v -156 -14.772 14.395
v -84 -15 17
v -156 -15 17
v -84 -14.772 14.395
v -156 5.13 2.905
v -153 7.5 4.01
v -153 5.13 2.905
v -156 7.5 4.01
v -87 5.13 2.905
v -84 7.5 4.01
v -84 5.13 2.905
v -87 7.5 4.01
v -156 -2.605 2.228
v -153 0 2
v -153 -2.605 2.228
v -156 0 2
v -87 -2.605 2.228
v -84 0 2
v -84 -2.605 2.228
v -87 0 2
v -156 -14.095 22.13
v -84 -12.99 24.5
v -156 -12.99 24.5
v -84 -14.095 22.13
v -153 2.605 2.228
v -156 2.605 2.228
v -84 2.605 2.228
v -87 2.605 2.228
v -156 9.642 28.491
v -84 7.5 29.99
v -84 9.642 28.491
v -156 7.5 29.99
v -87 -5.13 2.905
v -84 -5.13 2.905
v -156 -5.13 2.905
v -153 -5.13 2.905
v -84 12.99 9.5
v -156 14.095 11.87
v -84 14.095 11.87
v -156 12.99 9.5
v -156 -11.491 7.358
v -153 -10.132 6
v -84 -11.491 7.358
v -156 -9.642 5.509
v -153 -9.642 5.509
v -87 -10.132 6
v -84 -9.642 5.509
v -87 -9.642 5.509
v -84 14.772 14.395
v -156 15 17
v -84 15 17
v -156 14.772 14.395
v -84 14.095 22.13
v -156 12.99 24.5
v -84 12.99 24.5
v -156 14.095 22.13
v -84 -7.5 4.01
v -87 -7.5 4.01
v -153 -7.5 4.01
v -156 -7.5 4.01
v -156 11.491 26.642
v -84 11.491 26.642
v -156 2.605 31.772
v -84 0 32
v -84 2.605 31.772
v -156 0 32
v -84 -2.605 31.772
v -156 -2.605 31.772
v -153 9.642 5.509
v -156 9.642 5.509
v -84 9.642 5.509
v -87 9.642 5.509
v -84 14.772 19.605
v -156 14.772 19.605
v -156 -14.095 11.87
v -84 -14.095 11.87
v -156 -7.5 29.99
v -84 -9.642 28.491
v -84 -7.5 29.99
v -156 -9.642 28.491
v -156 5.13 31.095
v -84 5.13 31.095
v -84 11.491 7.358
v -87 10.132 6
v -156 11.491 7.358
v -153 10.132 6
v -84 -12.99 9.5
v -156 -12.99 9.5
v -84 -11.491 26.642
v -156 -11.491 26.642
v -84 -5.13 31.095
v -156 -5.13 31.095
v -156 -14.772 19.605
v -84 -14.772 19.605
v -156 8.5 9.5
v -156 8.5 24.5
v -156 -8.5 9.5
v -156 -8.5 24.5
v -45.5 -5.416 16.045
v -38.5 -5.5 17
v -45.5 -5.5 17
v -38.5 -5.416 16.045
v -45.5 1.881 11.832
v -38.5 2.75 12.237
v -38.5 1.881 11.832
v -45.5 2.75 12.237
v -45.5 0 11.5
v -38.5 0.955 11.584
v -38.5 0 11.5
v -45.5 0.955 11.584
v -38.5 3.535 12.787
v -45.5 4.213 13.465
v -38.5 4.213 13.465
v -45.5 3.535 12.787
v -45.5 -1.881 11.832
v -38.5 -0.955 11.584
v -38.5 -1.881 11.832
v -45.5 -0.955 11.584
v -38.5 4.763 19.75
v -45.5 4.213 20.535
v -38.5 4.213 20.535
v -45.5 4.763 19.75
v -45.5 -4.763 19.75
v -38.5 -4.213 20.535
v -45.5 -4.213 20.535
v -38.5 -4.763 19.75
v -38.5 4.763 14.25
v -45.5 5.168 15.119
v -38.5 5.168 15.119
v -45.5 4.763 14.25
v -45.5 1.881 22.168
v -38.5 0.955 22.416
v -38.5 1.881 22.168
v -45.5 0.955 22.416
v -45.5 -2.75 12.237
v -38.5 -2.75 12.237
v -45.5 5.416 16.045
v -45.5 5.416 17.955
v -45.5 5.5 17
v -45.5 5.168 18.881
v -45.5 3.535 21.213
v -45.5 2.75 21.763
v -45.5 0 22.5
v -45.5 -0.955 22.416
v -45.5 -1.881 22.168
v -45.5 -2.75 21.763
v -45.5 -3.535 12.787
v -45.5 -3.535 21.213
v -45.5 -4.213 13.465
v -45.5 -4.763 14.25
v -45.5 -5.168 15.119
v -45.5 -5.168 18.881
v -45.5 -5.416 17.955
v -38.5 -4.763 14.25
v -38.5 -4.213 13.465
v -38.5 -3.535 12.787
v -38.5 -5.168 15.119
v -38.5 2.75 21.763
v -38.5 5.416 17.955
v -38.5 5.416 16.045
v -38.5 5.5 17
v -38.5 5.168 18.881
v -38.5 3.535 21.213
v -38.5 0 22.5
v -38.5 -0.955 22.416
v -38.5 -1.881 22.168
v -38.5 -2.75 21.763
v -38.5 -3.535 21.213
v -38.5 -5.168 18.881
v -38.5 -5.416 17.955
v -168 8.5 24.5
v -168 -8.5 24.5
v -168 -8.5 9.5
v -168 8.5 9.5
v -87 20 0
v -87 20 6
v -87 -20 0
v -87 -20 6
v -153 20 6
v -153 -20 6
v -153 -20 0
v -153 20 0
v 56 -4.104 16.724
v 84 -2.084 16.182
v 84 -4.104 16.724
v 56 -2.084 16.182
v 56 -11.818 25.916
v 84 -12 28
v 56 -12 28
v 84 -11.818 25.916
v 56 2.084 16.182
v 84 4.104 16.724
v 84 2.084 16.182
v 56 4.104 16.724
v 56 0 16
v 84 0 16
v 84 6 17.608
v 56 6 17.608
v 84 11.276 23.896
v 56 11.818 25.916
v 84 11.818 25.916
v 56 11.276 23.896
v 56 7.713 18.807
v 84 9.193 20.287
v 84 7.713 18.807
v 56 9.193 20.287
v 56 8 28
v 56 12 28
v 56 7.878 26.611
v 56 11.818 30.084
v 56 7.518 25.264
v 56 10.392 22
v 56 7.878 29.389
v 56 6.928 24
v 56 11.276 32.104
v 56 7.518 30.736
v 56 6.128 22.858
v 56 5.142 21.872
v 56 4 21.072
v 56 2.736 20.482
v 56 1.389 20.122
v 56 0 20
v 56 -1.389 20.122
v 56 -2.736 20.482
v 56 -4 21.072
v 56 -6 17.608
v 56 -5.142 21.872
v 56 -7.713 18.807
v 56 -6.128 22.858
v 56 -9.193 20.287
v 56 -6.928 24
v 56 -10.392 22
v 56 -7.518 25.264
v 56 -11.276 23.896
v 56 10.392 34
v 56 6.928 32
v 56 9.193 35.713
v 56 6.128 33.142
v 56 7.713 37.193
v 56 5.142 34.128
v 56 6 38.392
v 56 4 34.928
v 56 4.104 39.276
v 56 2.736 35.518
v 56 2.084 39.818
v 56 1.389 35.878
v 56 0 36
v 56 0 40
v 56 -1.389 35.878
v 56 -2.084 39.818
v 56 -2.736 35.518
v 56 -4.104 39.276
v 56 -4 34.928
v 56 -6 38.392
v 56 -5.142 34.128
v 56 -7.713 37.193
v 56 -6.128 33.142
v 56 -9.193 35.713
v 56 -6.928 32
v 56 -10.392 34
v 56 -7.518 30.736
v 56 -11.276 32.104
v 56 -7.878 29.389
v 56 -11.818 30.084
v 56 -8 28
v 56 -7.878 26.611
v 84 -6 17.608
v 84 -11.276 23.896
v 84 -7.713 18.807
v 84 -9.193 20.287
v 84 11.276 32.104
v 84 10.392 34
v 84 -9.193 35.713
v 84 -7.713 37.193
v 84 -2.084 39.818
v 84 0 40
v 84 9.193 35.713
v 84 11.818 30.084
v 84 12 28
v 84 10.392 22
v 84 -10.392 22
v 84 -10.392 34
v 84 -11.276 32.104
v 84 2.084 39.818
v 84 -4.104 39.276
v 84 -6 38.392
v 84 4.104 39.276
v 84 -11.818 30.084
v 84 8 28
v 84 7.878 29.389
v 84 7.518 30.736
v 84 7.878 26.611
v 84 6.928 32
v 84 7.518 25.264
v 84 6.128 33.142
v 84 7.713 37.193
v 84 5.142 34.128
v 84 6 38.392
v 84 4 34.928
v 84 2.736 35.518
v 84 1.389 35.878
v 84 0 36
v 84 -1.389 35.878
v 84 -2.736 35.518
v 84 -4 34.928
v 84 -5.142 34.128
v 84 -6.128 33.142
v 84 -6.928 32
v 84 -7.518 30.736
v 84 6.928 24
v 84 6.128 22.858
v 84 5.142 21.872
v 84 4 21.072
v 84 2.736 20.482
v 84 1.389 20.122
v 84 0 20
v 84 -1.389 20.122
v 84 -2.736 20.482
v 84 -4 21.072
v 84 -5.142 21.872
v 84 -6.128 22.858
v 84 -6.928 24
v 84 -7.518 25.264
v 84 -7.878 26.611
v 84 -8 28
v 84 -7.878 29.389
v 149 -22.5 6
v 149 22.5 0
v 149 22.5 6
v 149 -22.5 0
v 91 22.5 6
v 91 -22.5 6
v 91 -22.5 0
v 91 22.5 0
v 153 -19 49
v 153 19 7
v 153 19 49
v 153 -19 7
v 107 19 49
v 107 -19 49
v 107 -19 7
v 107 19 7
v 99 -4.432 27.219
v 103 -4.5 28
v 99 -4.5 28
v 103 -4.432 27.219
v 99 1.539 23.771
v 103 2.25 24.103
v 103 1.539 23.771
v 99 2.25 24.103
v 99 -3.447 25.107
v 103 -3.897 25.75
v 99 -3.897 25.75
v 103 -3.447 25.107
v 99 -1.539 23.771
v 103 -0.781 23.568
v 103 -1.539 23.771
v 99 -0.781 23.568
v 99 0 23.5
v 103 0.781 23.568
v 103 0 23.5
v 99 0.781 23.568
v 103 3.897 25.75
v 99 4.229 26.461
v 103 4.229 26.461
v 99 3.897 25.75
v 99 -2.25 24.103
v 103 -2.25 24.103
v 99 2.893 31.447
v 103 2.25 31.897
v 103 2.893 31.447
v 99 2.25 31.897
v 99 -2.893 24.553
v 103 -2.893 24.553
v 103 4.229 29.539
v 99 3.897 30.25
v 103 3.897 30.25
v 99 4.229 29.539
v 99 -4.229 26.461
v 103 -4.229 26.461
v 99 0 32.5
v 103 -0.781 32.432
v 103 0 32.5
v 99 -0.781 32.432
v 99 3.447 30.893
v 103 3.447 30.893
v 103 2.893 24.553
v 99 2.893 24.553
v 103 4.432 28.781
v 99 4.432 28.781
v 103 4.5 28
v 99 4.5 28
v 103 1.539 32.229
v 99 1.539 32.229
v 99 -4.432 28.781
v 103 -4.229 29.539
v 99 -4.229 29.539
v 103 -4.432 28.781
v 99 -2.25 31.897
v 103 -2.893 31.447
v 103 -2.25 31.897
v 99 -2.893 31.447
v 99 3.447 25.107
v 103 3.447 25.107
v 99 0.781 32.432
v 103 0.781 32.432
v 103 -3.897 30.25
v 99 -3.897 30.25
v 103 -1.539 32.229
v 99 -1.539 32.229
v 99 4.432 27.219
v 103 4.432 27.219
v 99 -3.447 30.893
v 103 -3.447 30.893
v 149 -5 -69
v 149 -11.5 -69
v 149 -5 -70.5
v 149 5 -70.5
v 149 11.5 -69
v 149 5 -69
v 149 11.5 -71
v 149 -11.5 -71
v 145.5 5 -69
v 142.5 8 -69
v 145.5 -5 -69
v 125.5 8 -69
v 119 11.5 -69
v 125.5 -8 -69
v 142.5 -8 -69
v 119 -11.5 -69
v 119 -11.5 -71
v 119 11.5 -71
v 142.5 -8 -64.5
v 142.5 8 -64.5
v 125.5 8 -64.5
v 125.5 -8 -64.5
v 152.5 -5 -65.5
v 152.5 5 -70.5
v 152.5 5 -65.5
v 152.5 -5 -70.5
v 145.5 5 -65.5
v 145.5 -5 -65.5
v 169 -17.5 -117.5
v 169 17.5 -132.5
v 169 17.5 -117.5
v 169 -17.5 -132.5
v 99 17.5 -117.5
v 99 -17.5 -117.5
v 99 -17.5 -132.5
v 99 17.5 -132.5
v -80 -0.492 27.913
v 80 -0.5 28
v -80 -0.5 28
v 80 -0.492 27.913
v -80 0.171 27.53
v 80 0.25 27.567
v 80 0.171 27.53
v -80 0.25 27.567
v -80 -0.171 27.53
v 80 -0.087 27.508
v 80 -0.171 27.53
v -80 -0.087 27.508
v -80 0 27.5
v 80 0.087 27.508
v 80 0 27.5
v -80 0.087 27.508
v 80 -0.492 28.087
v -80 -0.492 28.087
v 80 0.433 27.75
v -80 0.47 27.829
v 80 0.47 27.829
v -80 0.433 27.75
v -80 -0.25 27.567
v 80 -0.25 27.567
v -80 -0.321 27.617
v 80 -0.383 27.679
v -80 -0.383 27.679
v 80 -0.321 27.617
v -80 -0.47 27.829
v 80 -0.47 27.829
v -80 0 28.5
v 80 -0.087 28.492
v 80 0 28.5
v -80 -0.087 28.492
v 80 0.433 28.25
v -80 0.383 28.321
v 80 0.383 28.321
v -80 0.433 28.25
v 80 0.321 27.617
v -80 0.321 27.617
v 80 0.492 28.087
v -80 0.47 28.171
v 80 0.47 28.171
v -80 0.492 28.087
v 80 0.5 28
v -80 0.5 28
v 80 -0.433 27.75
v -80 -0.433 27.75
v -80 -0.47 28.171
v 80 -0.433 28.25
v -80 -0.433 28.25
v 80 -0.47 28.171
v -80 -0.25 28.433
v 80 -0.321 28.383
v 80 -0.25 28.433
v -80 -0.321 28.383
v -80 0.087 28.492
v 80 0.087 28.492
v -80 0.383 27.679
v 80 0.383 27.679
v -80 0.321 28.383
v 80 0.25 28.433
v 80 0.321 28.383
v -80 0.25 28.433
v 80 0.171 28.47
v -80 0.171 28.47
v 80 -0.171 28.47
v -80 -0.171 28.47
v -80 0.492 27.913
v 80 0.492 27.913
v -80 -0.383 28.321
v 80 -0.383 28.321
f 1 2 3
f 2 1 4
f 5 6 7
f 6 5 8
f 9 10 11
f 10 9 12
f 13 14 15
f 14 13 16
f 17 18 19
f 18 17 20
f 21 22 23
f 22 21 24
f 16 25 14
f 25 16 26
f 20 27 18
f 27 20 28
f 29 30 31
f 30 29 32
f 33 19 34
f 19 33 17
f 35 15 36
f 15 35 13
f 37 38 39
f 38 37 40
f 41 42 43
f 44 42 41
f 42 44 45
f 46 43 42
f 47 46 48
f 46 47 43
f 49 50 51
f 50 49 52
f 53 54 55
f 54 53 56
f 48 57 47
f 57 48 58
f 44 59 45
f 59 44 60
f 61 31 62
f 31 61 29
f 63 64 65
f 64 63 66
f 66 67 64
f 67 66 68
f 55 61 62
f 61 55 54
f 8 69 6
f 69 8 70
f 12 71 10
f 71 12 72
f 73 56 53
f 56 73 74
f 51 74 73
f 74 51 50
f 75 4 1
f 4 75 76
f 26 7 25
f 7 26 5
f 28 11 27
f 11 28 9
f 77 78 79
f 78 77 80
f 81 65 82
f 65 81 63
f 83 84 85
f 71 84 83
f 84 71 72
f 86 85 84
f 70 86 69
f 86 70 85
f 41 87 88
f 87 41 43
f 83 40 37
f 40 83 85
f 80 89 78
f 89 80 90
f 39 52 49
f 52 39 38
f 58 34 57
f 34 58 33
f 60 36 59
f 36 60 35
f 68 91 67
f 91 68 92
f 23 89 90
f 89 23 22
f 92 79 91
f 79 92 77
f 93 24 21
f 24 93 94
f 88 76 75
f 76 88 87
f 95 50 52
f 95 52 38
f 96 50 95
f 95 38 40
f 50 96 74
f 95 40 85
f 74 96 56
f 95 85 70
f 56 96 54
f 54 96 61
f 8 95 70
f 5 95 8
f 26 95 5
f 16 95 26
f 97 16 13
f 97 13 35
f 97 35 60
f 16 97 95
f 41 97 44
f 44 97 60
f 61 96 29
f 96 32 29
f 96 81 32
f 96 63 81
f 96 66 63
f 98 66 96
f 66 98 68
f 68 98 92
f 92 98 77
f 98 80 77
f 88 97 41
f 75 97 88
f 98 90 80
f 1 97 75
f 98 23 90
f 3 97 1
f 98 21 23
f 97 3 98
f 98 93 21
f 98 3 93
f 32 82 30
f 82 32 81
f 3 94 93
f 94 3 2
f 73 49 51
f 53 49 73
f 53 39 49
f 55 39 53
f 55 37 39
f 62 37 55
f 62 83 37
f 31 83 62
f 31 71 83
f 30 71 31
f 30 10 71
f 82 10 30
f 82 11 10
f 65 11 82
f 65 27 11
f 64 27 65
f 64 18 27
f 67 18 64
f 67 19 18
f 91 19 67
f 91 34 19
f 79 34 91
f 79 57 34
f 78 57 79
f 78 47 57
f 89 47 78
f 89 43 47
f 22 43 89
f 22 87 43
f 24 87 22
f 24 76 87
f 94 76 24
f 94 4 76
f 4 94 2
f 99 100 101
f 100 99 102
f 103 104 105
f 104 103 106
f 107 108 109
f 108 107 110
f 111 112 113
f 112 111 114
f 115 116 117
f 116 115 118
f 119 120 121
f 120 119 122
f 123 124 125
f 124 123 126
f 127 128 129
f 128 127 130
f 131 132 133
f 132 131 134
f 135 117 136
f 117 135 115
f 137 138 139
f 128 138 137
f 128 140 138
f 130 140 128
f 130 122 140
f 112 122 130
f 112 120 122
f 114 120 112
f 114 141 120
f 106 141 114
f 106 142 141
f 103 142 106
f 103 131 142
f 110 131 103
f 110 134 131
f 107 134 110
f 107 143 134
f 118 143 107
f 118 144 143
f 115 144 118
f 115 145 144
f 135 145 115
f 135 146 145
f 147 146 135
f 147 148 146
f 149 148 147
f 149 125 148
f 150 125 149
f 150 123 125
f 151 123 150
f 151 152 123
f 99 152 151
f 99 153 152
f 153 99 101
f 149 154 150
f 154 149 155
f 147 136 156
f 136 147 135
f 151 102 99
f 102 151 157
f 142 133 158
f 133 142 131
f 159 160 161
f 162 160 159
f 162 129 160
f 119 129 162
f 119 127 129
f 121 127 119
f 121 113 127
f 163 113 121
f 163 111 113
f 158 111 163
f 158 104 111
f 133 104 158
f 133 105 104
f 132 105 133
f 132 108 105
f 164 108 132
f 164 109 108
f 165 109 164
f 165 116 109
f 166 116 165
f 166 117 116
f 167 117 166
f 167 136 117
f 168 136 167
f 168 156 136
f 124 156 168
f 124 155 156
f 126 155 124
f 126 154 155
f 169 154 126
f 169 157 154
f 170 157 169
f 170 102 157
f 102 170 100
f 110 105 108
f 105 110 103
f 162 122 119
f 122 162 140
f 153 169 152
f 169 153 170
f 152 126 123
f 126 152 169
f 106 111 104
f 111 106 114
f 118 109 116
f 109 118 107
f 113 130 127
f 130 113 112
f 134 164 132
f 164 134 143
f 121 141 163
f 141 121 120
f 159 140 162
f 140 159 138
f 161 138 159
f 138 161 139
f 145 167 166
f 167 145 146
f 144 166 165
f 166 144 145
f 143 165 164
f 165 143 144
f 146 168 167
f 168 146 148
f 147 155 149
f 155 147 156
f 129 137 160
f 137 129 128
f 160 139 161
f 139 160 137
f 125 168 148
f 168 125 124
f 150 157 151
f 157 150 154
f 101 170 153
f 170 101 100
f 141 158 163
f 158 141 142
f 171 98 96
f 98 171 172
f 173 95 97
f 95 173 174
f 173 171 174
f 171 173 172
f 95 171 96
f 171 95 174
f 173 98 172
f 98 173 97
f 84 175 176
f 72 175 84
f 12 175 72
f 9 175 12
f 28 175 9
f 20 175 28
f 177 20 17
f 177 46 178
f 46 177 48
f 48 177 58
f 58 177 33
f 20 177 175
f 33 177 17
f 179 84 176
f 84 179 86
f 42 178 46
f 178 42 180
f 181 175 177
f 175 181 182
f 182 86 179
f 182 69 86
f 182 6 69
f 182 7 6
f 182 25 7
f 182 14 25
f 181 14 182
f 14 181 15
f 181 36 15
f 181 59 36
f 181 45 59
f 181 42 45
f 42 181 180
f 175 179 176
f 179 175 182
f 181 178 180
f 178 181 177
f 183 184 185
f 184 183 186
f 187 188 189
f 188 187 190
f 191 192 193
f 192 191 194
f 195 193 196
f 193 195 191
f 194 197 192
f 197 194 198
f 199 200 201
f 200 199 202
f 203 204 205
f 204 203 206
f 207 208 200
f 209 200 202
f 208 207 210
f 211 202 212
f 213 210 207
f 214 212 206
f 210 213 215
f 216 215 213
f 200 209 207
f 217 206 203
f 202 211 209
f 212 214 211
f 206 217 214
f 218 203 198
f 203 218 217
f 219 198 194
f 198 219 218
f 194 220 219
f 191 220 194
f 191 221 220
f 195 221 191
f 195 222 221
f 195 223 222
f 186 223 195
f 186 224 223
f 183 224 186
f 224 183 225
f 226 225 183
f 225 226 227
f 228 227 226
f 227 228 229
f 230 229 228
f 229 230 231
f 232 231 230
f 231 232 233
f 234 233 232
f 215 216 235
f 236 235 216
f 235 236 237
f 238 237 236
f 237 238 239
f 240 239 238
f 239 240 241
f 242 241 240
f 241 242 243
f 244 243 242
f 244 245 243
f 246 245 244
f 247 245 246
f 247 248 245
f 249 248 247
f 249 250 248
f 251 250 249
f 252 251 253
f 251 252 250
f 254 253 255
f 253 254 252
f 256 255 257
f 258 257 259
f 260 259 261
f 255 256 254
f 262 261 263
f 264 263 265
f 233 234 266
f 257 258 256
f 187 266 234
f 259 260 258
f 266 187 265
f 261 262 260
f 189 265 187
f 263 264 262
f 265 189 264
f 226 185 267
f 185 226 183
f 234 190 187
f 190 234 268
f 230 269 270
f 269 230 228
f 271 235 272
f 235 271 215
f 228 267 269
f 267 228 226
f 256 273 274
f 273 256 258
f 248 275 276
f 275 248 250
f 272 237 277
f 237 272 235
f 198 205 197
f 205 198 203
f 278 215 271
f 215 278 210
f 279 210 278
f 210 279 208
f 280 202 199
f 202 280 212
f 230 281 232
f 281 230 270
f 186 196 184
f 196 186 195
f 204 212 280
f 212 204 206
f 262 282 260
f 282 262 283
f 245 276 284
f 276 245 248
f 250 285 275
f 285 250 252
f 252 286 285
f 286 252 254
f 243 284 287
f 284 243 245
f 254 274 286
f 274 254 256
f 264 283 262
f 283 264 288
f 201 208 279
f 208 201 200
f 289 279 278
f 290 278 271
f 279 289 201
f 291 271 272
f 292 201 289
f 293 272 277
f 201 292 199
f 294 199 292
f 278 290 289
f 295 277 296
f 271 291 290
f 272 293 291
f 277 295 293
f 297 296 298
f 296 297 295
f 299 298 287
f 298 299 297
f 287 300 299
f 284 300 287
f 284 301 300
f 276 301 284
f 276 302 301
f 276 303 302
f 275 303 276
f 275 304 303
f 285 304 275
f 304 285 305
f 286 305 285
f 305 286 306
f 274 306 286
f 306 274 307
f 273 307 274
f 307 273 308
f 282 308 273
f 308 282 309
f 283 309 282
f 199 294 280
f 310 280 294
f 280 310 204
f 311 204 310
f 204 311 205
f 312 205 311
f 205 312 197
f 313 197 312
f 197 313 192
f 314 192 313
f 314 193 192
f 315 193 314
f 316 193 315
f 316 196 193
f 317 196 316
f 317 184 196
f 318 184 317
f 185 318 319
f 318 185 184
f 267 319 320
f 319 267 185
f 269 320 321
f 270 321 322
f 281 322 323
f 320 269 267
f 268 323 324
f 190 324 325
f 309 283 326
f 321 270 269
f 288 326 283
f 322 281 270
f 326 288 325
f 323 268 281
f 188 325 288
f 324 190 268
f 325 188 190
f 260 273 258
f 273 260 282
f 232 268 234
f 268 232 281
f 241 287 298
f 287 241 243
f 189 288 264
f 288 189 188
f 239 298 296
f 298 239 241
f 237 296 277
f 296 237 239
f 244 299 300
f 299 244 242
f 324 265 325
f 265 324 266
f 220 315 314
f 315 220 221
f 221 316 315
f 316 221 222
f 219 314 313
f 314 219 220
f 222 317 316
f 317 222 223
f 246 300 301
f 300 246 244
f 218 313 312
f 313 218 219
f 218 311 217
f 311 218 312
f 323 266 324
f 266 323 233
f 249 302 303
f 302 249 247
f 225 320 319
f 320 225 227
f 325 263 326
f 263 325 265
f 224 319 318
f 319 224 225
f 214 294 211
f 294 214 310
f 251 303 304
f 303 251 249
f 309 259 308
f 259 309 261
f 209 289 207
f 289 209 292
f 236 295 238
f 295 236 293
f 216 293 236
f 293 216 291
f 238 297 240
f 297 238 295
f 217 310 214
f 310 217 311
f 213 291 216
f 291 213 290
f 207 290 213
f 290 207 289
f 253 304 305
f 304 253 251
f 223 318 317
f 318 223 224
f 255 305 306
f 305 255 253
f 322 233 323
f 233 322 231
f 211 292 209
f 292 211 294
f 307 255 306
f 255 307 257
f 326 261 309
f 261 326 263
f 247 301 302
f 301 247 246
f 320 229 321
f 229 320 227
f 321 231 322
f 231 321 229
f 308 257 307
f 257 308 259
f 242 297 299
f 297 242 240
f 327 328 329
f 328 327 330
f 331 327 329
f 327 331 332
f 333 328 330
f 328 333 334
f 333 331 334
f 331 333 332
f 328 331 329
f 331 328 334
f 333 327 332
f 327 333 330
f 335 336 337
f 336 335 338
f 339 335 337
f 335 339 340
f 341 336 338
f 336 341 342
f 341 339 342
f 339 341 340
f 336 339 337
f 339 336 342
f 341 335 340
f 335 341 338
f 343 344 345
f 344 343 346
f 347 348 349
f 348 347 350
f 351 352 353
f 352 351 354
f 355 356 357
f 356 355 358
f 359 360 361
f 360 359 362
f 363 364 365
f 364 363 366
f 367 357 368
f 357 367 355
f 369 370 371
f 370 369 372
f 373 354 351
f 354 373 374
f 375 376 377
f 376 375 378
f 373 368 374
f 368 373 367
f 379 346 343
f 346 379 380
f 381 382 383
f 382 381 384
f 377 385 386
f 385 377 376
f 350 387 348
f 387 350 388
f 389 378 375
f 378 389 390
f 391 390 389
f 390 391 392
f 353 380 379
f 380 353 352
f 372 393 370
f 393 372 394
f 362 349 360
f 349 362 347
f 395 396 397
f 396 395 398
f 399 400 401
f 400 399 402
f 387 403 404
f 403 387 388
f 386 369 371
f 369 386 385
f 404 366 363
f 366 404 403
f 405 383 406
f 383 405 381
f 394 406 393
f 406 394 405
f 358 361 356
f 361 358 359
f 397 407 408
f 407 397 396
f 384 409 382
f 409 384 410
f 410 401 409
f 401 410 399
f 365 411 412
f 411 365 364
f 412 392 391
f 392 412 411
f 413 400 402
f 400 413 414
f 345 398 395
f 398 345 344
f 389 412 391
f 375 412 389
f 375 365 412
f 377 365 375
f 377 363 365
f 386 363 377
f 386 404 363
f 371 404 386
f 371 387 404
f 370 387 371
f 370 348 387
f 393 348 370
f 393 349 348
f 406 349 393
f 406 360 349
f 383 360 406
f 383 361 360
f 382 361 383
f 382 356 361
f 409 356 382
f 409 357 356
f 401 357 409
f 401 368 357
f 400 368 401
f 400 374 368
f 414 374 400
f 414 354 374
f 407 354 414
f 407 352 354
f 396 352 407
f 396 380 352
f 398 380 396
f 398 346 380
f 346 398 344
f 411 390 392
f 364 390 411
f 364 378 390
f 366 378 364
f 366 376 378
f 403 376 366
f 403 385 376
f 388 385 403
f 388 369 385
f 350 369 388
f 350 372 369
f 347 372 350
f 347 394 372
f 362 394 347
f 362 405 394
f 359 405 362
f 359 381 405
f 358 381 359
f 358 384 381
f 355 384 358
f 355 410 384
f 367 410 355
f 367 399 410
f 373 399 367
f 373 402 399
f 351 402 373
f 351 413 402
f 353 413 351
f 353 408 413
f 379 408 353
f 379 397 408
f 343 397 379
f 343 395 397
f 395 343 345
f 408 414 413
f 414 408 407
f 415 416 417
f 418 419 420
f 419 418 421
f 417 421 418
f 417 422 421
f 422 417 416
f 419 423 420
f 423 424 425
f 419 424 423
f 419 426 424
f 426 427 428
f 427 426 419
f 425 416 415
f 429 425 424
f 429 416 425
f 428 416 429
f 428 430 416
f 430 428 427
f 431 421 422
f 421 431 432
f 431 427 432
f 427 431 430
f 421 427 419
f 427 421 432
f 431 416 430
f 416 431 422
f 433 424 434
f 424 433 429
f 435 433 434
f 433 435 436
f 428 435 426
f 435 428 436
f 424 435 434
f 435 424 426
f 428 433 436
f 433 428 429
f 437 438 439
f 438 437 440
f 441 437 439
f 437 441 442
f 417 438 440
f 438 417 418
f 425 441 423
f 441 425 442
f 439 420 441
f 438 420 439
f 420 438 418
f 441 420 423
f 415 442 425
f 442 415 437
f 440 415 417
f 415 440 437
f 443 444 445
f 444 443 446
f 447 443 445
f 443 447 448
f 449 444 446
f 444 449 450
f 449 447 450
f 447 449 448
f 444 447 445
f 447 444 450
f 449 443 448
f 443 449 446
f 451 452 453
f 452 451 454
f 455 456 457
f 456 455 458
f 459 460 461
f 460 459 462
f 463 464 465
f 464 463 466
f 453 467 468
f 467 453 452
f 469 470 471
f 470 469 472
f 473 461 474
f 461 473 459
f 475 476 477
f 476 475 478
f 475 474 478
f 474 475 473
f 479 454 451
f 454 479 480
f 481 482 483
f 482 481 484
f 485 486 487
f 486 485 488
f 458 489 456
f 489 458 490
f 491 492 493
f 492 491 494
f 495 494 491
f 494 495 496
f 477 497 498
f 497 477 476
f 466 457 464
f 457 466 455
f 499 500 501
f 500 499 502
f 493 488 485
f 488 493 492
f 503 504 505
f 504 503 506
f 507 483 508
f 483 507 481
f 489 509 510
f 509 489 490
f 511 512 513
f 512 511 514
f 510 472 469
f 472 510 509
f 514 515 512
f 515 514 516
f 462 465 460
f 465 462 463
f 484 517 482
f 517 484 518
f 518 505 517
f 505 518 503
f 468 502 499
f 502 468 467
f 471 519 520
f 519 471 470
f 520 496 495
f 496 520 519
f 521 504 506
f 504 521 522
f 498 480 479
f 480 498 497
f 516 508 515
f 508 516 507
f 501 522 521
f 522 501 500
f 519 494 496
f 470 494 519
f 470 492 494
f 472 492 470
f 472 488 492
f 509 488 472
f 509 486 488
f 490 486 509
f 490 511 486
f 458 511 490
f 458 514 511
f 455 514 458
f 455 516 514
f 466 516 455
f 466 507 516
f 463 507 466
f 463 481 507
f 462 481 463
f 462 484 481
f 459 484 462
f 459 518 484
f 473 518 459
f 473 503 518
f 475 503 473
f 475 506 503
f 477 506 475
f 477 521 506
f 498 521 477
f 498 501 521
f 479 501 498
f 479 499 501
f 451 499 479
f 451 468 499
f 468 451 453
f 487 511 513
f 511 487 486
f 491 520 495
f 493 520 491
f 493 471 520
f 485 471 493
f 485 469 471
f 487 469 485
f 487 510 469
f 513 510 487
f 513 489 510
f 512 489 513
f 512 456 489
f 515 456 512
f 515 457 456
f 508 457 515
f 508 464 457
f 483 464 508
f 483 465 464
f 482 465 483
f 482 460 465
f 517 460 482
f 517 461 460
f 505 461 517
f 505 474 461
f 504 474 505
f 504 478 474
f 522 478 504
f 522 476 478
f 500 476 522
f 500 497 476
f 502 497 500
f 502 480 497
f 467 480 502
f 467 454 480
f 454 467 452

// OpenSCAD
// McGruber light-beam tripwire — conceptual space reservation only.
// Units: mm. Placeholder dimensions are illustrative, NOT measured or print-ready.
// Set explode = 0 for assembled, 1 for exploded; show_* toggles components.
$fn=36;
explode=1; // [0:0.05:1]
show_emitter=true;
show_receiver=true;
show_controller=true;
show_power=true;
beam_span=240; // [120:10:500] illustrative emitter-to-receiver distance
module box(x,y,z,c=[0.6,0.7,0.8]) {color(c) cube([x,y,z],center=true);}
module emitter() {
  // Placeholder 90x30x30 mm torch body, removable front LED and battery volume
  translate([-beam_span/2,0,17]) rotate([0,90,0]) color([0.2,0.27,0.31]) cylinder(h=72,d=30,center=true);
  translate([-beam_span/2+43+explode*35,0,17]) rotate([0,90,0]) color([1,0.65,0.45]) cylinder(h=7,d=11,center=true);
  translate([-beam_span/2-5-explode*24,0,17]) box(38,17,15,[0.32,0.48,0.67]);
  translate([-beam_span/2,0,3]) box(66,40,6,[0.36,0.4,0.45]);
}
module receiver() {
  translate([beam_span/2,0,3]) box(58,45,6,[0.36,0.4,0.45]);
  translate([beam_span/2+10,0,28]) box(46,38,42,[0.3,0.39,0.48]);
  translate([beam_span/2-23-explode*27,0,28]) rotate([0,90,0]) color([0.12,0.17,0.21]) difference() {
    cylinder(h=28,d=24,center=true);
    cylinder(h=30,d=16,center=true);
  }
  translate([beam_span/2-5-explode*14,0,28]) rotate([0,90,0]) color([0.82,0.51,0.25]) cylinder(h=4,d=9,center=true);
}
module controller() {
  translate([beam_span/2+14,0,-30-explode*40]) {
    box(30,23,2,[0.05,0.35,0.34]);
    translate([0,0,3]) box(17,16,5,[0.65,0.69,0.71]);
    translate([15,0,2]) box(7,10,5,[0.65,0.69,0.71]);
  }
}
module power() {
  translate([beam_span/2+14,0,-65-explode*60]) box(70,35,15,[0.22,0.26,0.31]);
}
if(show_emitter) emitter();
if(show_receiver) receiver();
if(show_controller) controller();
if(show_power) power();
// Optical path is a visualization, not a physical solid or laser recommendation.
color([1,0.7,0.18,0.35]) translate([0,0,28]) rotate([0,90,0]) cylinder(h=beam_span-80,d=1,center=true);
